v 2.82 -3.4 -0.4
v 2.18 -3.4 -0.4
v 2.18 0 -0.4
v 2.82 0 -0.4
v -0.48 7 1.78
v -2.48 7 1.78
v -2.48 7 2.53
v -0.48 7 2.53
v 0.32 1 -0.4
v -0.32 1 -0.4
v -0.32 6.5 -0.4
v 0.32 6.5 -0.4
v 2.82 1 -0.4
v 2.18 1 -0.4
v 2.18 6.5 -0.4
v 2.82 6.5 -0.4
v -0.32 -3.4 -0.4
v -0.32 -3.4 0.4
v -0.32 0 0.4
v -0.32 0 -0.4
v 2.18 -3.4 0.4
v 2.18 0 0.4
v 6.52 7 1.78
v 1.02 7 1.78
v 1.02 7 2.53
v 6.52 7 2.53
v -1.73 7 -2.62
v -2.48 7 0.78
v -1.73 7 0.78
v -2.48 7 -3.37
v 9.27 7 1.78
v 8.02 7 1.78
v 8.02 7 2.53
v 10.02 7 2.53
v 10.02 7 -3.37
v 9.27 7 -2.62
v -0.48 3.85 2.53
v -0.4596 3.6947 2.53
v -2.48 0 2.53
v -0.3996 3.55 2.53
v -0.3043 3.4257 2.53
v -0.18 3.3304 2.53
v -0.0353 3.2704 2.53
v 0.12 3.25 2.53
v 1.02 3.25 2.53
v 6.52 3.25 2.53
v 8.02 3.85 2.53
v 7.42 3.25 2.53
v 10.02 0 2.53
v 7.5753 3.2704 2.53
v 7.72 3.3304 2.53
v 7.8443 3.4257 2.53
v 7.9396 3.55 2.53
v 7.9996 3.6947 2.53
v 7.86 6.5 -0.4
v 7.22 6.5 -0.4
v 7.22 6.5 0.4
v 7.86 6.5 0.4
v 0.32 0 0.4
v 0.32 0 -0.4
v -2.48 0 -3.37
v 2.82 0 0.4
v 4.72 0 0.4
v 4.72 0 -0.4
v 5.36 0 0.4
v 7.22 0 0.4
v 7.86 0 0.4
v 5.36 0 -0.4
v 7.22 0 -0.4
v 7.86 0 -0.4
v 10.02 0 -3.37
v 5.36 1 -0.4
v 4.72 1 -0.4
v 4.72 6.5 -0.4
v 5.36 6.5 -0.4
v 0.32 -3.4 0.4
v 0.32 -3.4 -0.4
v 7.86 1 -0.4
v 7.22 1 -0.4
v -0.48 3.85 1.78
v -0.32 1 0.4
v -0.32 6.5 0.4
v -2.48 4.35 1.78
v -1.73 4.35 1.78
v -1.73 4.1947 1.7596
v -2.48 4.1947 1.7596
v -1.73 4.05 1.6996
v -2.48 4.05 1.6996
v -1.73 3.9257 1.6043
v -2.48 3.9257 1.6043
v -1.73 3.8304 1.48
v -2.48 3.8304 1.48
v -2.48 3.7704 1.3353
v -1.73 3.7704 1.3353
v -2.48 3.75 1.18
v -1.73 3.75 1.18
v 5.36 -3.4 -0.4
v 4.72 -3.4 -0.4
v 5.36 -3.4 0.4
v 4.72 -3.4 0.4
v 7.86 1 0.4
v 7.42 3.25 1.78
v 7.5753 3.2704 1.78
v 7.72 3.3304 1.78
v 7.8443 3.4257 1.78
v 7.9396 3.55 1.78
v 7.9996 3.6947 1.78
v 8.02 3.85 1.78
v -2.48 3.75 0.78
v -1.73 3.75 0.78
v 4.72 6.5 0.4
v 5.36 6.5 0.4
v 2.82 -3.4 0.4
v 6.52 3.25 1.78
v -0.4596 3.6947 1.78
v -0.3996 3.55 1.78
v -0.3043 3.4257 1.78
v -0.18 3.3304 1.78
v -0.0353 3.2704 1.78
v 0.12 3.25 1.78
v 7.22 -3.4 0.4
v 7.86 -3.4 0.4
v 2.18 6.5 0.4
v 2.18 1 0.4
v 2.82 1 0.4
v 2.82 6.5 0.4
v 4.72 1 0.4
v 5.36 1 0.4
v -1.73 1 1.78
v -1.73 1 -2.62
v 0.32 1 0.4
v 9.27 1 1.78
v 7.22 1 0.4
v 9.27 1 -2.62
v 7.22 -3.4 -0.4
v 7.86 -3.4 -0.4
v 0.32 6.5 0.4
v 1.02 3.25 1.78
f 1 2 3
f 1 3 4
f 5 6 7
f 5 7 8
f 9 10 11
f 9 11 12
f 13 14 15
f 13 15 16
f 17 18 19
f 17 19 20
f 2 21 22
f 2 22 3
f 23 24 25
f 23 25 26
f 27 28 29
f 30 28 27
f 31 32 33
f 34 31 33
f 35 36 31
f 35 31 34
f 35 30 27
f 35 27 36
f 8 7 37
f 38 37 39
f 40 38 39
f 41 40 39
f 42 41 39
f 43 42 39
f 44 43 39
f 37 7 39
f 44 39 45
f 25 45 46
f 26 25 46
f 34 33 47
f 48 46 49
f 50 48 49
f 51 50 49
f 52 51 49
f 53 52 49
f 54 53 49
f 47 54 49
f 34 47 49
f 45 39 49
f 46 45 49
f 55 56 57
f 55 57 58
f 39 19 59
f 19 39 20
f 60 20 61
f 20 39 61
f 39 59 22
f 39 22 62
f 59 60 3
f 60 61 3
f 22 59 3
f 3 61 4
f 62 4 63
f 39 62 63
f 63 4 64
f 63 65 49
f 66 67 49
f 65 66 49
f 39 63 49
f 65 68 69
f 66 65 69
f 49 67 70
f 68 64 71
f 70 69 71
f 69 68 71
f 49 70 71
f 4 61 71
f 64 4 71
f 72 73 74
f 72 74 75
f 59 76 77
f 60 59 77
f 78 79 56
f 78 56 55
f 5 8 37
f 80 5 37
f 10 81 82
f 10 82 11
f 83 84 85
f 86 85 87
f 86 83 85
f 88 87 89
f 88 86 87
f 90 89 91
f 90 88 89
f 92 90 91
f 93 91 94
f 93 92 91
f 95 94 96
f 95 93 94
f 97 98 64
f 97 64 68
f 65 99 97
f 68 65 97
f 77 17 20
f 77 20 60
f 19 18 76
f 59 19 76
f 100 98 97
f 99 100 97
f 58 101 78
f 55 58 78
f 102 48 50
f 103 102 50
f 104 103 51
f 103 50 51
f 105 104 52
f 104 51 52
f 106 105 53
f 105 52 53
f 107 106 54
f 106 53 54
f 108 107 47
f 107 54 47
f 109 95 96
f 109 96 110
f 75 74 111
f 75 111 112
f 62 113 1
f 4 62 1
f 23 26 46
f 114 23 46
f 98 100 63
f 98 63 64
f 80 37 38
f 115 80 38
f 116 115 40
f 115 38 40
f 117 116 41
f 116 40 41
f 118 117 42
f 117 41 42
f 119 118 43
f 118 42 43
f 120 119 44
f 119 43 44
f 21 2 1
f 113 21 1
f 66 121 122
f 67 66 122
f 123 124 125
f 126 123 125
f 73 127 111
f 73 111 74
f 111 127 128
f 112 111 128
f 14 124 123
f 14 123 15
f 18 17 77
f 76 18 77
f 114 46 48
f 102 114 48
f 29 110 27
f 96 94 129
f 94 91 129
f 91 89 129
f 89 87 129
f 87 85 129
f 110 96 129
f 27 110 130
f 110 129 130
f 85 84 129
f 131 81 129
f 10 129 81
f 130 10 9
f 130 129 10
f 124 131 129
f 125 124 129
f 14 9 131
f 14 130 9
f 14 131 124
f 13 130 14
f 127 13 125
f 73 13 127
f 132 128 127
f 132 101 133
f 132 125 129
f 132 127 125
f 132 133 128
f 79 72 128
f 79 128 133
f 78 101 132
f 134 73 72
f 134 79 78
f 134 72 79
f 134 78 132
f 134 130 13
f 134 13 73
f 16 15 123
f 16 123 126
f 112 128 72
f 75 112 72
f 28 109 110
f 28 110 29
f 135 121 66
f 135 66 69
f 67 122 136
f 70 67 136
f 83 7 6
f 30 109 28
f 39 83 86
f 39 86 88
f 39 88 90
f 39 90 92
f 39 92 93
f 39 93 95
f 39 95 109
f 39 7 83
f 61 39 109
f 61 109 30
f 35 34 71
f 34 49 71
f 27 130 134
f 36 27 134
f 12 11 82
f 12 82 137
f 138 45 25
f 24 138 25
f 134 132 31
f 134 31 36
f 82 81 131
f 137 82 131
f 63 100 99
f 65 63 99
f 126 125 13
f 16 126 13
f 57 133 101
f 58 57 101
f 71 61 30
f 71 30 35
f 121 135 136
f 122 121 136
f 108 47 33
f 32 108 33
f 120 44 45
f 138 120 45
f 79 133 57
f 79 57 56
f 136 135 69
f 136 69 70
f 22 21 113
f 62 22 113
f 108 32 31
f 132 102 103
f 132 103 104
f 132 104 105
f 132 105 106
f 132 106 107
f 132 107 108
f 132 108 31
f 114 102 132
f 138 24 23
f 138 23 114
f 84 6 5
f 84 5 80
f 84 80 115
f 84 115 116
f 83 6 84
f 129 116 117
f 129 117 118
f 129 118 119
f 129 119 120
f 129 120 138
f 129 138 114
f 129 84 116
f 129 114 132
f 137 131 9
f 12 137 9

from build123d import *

# Parameters (mm, degrees)
CROQUIS1_W                   = 12.5
CROQUIS1_H                   = 5.9
CROQUIS1_W_2                 = 0.64
CROQUIS1_H_2                 = 0.8
SALIENTE_EXTRUIR1_DEPTH      = 1
CROQUIS2_W                   = 12.5
CROQUIS2_H                   = 5.9
CROQUIS2_W_2                 = 11
CROQUIS2_H_2                 = 4.4
SALIENTE_EXTRUIR2_DEPTH      = 6
CORTAR_EXTRUIR1_DEPTH        = 9
CORTAR_EXTRUIR2_DEPTH        = 2
SALIENTE_EXTRUIR3_DEPTH      = 6.5
SALIENTE_EXTRUIR3_DEPTH_BACK = 3.4
CROQUIS5_W                   = 0.64
CROQUIS5_H                   = 0.8


with BuildPart() as part:
    # Croquis1 → Saliente-Extruir1 (new body)
    with BuildSketch(Plane(origin=(0, 0, 0), x_dir=(1, 0, 0), z_dir=(0, 1, 0))):
        with Locations((3.77, 0.42)):
            Rectangle(CROQUIS1_W, CROQUIS1_H)
        Rectangle(CROQUIS1_W_2, CROQUIS1_H_2, mode=Mode.SUBTRACT)
        with Locations((7.54, 0)):
            Rectangle(CROQUIS1_W_2, CROQUIS1_H_2, mode=Mode.SUBTRACT)
        with Locations((5.04, 0)):
            Rectangle(CROQUIS1_W_2, CROQUIS1_H_2, mode=Mode.SUBTRACT)
        with Locations((2.5, 0)):
            Rectangle(CROQUIS1_W_2, CROQUIS1_H_2, mode=Mode.SUBTRACT)
    extrude(amount=SALIENTE_EXTRUIR1_DEPTH)

    # Croquis2 → Saliente-Extruir2 (add)
    with BuildSketch(Plane(origin=(0, 1, 0), x_dir=(1, 0, 0), z_dir=(0, 1, 0))):
        with Locations((3.77, 0.42)):
            Rectangle(CROQUIS2_W, CROQUIS2_H)
        with Locations((3.77, 0.42)):
            Rectangle(CROQUIS2_W_2, CROQUIS2_H_2, mode=Mode.SUBTRACT)
    extrude(amount=SALIENTE_EXTRUIR2_DEPTH)

    # Croquis3 → Cortar-Extruir1 (cut)
    with BuildSketch(Plane.ZY.offset(2.48)):
        with BuildLine():
            Line((1.78, 7), (1.78, 4.35))
            ThreePointArc((1.78, 4.35), (1.604264069, 3.925735931), (1.18, 3.75))
            Line((1.18, 3.75), (0.78, 3.75))
            Line((0.78, 3.75), (0.78, 7))
            Line((0.78, 7), (1.78, 7))
        make_face()
    extrude(amount=-CORTAR_EXTRUIR1_DEPTH, mode=Mode.SUBTRACT)

    # Croquis4 → Cortar-Extruir2 (cut)
    with BuildSketch(Plane.XY.offset(2.53)):
        with BuildLine():
            Line((-0.48, 7), (-0.48, 3.85))
            ThreePointArc((-0.48, 3.85), (-0.304264069, 3.425735931), (0.12, 3.25))
            Line((0.12, 3.25), (1.02, 3.25))
            Line((1.02, 3.25), (1.02, 7))
            Line((1.02, 7), (-0.48, 7))
        make_face()
        with BuildLine():
            Line((8.02, 7), (6.52, 7))
            Line((6.52, 7), (6.52, 3.25))
            Line((6.52, 3.25), (7.42, 3.25))
            ThreePointArc((7.42, 3.25), (7.844264069, 3.425735931), (8.02, 3.85))
            Line((8.02, 3.85), (8.02, 7))
        make_face()
    extrude(amount=-CORTAR_EXTRUIR2_DEPTH, mode=Mode.SUBTRACT)

    # Croquis5 → Saliente-Extruir3 (add, two sides: drawn at the far end of the back side and taken through both)
    with BuildSketch(Plane(origin=(0, 0, 0), x_dir=(1, 0, 0), z_dir=(0, 1, 0)).offset(-SALIENTE_EXTRUIR3_DEPTH_BACK)):
        with Locations((7.54, 0)):
            Rectangle(CROQUIS5_W, CROQUIS5_H)
        Rectangle(CROQUIS5_W, CROQUIS5_H)
        with Locations((2.5, 0)):
            Rectangle(CROQUIS5_W, CROQUIS5_H)
        with Locations((5.04, 0)):
            Rectangle(CROQUIS5_W, CROQUIS5_H)
    extrude(amount=SALIENTE_EXTRUIR3_DEPTH + SALIENTE_EXTRUIR3_DEPTH_BACK)


solid = part.part
